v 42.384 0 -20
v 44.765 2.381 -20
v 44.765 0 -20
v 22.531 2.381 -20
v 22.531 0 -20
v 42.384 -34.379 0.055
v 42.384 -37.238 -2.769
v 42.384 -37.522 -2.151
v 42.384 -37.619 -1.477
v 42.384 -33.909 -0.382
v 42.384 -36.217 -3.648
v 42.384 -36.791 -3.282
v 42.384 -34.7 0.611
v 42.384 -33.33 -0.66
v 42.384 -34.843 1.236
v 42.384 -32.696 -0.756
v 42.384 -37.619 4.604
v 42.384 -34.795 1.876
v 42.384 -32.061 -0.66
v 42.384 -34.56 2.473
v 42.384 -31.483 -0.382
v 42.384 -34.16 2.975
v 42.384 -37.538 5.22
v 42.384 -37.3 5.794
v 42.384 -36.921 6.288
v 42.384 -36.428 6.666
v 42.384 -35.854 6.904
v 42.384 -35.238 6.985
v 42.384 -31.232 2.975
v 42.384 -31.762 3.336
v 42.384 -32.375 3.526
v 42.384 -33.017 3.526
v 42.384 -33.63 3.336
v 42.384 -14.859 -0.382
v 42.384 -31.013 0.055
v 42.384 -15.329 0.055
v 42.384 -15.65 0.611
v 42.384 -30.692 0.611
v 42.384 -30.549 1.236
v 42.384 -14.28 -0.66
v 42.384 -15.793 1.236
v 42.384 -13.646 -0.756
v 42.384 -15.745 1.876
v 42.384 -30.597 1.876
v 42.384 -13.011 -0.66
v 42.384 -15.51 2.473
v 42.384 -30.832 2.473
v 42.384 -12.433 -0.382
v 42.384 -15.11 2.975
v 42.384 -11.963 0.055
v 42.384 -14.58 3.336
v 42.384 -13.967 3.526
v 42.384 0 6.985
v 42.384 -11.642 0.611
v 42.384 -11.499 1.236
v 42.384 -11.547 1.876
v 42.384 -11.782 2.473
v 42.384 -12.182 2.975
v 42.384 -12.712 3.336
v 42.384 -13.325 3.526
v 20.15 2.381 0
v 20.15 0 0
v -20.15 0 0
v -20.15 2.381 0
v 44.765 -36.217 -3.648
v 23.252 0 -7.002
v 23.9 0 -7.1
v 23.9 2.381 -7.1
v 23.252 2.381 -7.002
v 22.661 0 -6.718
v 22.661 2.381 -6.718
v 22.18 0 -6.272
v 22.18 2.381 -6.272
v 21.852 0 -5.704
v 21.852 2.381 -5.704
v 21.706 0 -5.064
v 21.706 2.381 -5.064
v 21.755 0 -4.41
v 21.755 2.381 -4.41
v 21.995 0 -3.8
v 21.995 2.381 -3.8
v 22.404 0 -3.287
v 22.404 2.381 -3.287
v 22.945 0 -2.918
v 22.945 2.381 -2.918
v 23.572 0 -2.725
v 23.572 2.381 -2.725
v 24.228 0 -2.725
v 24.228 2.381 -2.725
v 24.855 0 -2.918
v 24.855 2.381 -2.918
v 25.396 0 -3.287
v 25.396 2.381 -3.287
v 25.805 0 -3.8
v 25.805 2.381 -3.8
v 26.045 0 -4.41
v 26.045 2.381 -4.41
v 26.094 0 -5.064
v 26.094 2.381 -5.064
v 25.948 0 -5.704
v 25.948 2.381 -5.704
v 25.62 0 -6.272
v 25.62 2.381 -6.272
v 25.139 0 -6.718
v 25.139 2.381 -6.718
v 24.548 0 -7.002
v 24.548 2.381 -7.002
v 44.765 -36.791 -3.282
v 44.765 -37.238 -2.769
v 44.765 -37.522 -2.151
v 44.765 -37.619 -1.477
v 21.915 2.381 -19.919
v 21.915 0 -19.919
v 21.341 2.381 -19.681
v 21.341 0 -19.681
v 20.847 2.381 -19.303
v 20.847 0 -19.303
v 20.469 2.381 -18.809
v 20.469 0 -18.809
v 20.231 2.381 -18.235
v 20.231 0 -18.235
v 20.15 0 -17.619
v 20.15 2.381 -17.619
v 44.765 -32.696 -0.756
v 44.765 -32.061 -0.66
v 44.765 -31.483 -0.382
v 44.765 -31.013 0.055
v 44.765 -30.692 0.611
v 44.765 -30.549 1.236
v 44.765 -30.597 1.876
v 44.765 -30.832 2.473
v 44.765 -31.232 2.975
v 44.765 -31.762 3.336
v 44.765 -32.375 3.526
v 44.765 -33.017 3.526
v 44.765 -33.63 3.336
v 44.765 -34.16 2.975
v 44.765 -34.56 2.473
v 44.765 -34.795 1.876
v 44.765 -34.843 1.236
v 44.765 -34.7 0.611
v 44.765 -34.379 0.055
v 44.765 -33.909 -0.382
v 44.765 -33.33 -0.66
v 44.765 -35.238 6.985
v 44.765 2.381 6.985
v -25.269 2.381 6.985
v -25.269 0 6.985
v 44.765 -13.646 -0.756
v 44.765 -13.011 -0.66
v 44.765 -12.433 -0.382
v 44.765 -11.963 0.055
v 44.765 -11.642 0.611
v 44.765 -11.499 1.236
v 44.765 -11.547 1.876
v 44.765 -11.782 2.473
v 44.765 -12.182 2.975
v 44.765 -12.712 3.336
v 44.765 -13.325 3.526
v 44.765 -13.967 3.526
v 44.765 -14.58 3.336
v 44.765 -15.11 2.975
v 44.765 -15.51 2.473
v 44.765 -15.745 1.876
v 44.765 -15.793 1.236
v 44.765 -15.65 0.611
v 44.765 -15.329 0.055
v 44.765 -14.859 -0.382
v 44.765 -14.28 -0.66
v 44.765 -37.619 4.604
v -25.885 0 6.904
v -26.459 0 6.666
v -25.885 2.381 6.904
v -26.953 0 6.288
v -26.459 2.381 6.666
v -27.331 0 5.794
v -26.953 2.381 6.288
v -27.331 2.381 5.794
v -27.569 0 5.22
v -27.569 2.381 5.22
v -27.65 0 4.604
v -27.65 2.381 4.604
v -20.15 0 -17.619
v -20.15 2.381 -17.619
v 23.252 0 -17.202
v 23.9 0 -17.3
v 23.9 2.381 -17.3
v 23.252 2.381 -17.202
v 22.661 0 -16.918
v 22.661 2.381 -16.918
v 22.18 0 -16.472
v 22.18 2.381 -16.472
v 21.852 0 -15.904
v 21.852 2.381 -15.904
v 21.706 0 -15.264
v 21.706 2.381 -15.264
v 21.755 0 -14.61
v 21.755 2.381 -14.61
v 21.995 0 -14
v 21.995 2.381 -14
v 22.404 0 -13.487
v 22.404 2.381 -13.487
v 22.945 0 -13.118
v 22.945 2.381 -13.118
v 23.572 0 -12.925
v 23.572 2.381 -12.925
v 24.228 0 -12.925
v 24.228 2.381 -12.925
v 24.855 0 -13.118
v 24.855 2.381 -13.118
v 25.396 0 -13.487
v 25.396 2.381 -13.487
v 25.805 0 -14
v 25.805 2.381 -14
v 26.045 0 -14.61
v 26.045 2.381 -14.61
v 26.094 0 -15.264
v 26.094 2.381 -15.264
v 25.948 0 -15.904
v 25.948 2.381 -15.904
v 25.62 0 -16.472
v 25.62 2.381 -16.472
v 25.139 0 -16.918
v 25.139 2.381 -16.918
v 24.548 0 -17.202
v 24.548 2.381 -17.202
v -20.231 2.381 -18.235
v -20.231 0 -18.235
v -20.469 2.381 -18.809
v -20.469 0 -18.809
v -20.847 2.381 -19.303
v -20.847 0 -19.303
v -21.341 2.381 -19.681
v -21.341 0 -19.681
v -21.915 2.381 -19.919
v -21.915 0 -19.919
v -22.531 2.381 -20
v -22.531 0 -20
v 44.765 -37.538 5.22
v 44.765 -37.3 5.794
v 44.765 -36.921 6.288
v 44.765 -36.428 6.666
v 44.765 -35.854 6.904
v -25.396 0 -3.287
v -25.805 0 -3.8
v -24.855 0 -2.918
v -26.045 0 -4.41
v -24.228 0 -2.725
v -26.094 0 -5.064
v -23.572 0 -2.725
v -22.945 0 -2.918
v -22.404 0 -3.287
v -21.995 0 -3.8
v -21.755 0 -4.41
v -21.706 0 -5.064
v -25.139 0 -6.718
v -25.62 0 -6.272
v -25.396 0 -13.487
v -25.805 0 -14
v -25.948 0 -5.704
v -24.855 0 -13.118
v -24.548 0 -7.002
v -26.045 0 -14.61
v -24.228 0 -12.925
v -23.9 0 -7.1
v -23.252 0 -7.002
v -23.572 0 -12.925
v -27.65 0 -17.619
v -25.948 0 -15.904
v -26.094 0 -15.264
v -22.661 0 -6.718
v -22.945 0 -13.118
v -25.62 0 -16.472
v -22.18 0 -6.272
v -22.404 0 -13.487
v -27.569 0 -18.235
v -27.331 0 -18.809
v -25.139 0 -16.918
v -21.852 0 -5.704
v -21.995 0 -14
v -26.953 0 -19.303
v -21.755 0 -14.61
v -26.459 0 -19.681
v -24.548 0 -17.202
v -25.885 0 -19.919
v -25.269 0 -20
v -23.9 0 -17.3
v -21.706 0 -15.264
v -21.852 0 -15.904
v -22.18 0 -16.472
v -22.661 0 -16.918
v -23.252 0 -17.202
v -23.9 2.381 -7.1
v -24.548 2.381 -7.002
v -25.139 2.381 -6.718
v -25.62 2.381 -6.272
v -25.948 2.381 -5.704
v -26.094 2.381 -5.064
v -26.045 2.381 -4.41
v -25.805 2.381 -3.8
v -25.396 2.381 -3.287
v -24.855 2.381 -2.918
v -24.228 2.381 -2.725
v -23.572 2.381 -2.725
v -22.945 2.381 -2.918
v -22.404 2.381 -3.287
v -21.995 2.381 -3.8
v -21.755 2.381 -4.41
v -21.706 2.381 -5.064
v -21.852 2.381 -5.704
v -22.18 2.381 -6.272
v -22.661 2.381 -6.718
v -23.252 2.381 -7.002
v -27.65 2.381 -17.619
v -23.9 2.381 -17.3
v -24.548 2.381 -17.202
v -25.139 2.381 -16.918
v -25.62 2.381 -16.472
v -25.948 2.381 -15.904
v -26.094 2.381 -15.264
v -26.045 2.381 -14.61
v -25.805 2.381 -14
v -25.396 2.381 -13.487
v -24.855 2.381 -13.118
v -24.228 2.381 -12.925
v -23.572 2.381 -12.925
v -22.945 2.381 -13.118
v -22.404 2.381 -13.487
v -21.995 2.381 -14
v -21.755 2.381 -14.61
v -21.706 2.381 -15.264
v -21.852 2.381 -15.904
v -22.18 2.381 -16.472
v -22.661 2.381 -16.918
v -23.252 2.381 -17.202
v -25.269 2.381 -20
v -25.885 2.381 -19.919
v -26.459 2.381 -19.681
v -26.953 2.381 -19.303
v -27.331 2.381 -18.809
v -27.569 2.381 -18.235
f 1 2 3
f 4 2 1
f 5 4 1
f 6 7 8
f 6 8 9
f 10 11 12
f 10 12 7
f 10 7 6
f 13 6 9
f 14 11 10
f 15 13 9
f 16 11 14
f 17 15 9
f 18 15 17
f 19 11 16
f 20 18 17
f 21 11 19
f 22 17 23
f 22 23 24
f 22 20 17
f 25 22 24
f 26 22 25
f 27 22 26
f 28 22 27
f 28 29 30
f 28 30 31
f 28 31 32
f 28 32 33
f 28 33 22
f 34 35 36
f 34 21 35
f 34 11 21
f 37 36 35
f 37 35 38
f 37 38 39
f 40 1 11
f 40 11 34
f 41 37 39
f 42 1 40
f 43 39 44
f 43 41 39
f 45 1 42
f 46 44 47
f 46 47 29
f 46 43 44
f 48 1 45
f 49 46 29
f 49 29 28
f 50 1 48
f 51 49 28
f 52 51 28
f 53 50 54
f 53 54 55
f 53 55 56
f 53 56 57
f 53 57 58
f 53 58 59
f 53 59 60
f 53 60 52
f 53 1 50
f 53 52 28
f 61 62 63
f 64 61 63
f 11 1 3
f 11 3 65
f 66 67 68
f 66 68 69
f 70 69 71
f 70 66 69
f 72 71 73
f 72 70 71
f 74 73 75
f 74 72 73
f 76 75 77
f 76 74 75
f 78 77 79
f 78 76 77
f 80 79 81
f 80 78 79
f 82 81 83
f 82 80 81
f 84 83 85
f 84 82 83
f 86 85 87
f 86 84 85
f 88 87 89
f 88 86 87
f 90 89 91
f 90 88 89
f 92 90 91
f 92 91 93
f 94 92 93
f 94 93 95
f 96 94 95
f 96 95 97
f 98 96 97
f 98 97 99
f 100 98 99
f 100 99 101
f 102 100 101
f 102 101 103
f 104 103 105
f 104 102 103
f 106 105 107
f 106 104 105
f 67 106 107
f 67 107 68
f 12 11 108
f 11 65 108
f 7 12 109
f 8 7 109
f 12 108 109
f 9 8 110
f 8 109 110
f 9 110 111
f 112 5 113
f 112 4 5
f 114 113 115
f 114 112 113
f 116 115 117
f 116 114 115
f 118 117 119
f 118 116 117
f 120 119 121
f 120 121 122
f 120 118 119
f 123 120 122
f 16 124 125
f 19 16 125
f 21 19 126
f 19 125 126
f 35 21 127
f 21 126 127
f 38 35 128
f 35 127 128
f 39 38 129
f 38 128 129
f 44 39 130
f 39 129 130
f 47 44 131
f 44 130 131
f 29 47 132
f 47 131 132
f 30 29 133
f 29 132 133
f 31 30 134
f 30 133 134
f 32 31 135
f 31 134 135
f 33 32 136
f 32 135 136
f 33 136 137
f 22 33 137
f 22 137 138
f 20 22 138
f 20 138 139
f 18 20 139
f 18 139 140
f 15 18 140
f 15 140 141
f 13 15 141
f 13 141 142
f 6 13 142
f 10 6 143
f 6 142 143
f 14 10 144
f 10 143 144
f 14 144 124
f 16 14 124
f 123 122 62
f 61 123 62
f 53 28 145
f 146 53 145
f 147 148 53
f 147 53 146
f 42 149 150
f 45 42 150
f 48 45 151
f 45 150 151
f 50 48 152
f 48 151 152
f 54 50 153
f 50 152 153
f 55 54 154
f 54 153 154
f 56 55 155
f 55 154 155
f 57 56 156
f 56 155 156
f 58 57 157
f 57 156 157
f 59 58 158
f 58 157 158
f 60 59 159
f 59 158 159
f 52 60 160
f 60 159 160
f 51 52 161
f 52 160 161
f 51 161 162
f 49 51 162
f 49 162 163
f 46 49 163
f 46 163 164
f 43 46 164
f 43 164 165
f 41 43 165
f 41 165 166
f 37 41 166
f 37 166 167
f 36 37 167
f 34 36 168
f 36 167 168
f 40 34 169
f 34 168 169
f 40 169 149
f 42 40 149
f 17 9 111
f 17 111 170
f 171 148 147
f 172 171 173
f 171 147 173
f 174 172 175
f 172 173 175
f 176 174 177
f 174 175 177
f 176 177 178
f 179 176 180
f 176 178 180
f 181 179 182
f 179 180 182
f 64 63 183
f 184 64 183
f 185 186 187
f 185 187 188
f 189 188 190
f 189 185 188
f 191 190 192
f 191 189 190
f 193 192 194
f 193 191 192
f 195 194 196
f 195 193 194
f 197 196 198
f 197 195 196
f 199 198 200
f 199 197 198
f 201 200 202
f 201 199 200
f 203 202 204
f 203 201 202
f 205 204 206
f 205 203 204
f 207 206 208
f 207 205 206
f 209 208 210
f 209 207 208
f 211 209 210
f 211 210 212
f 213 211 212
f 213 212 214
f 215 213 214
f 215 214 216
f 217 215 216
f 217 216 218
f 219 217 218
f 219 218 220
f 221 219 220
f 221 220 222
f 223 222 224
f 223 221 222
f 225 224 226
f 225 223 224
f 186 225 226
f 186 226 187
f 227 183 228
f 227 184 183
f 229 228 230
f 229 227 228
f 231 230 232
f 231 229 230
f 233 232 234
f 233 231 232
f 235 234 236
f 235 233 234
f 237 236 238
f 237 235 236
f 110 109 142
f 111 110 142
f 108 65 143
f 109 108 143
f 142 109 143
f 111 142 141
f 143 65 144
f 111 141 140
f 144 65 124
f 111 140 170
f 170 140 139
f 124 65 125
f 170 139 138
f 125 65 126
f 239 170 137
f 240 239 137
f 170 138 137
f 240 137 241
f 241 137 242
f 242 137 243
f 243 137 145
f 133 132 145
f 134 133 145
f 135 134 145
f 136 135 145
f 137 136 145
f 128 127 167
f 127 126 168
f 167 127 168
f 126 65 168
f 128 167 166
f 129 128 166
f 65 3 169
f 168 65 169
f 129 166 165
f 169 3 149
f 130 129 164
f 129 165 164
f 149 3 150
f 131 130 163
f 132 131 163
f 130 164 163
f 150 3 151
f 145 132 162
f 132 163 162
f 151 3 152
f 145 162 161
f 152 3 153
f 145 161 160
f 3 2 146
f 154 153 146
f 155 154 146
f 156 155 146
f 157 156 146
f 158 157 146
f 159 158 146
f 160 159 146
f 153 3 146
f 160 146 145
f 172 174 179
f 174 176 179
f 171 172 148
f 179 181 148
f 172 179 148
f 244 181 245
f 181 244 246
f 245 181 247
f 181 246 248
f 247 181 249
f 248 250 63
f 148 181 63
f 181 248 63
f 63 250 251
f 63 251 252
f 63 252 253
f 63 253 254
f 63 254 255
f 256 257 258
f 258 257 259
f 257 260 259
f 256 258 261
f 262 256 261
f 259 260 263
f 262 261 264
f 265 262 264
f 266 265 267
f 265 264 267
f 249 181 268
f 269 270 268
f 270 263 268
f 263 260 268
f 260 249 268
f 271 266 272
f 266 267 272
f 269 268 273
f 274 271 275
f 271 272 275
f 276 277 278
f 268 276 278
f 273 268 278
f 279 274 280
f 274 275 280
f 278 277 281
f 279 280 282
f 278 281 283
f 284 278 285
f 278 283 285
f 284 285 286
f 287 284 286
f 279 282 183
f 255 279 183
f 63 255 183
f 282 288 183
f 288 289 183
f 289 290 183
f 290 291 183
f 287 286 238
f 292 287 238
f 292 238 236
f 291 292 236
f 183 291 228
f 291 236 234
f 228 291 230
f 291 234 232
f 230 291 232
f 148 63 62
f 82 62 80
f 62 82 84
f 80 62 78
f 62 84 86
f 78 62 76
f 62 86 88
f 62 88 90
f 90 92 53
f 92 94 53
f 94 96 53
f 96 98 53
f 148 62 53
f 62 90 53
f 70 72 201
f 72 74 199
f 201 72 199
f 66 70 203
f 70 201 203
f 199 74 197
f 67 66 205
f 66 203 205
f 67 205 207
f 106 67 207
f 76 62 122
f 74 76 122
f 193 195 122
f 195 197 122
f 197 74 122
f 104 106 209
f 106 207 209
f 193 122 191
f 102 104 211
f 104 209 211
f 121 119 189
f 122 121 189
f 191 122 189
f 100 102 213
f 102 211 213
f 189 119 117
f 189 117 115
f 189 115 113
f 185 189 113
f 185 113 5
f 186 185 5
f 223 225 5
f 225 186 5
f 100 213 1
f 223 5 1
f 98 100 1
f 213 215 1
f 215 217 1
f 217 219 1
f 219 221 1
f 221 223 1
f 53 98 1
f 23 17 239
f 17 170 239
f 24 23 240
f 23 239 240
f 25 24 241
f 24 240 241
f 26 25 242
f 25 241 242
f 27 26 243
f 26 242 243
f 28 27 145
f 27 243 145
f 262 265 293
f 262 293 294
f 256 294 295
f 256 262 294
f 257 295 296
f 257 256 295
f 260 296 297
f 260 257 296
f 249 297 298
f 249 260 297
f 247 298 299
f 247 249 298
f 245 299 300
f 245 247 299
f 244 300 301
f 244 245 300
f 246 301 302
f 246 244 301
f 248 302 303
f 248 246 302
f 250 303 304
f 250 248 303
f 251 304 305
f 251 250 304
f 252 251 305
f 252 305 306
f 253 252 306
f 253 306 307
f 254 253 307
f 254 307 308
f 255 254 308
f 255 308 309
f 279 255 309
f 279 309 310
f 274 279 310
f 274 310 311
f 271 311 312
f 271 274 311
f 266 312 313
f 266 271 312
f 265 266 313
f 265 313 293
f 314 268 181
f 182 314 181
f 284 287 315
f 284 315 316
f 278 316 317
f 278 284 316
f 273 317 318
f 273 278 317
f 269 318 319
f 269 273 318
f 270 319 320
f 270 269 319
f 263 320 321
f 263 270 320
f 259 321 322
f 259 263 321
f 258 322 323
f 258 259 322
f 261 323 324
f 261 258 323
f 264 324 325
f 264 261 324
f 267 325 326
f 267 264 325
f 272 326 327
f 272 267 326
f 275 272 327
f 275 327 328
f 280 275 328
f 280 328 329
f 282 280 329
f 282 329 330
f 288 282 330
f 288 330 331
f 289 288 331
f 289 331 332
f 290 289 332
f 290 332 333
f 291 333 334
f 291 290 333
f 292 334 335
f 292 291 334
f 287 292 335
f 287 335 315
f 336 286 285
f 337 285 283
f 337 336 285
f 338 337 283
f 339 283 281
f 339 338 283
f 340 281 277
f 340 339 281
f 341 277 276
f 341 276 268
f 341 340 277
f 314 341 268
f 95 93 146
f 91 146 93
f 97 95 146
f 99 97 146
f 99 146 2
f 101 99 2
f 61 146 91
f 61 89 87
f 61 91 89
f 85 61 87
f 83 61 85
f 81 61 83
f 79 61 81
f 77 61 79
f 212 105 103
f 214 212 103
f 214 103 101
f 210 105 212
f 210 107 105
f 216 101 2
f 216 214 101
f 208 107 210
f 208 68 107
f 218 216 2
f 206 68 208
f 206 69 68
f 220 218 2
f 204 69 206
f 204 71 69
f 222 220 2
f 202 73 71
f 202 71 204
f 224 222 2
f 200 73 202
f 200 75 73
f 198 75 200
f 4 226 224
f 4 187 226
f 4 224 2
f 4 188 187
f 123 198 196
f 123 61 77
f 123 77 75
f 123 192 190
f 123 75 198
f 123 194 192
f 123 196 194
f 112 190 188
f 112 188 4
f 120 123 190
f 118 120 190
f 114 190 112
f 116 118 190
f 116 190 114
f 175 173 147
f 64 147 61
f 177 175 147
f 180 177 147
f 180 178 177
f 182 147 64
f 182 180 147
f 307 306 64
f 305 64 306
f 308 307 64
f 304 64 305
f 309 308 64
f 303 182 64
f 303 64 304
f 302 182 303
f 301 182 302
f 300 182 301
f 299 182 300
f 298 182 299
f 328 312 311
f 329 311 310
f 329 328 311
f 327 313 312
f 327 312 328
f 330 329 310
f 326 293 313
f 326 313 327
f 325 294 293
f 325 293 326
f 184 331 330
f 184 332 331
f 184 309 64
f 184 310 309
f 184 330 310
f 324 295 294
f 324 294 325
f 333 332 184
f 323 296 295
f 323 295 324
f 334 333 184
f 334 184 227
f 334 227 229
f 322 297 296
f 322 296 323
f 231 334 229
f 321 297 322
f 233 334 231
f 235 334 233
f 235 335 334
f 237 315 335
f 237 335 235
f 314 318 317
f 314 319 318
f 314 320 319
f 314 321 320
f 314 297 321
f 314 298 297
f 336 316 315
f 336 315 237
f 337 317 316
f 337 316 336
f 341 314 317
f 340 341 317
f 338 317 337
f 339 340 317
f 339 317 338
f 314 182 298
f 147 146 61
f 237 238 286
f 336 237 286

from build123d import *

# Parameters (mm, degrees)
SKETCH1_R           = 2.2
BOSS_EXTRUDE1_DEPTH = 2.38125
BOSS_EXTRUDE3_DEPTH = 2.38125
SKETCH4_R           = 2.15265
CUT_EXTRUDE1_DEPTH  = 2.38125
FILLET2_R           = 2.38125


with BuildPart() as part:
    # Sketch1 → Boss-Extrude1 (new body)
    # profile 1 of 2: a face of its own
    with BuildSketch(Plane(origin=(0, 0, 0), x_dir=(1, 0, 0), z_dir=(0, 1, 0))):
        Polygon((0, -6.985), (0, 0), (-20.15, 0), (-20.15, 20), (-27.65, 20), (-27.65, -6.985), align=None)
        with Locations(Location((-23.9, 4.9, 0), (0, 0, 90))):
            Circle(SKETCH1_R, mode=Mode.SUBTRACT)
        with Locations(Location((-23.9, 15.1, 0), (0, 0, 90))):
            Circle(SKETCH1_R, mode=Mode.SUBTRACT)
    # profile 2 of 2: a face of its own
    with BuildSketch(Plane(origin=(0, 0, 0), x_dir=(1, 0, 0), z_dir=(0, 1, 0))):
        Polygon((20.15, 20), (20.15, 0), (0, 0), (0, -6.985), (27.65, -6.985), (42.38375, -6.985), (42.38375, 20), align=None)
        with Locations(Location((23.9, 4.9, 0), (0, 0, 90))):
            Circle(SKETCH1_R, mode=Mode.SUBTRACT)
        with Locations(Location((23.9, 15.1, 0), (0, 0, 90))):
            Circle(SKETCH1_R, mode=Mode.SUBTRACT)
    extrude(amount=BOSS_EXTRUDE1_DEPTH)

    # Sketch3 → Boss-Extrude3 (add)
    with BuildSketch(Plane(origin=(42.38375, 0, 0), x_dir=(0, 0, -1), z_dir=(1, 0, 0))):
        Polygon((20, 0), (3.015, -37.61875), (-6.985, -37.61875), (-6.985, 2.38125), (20, 2.38125), align=None)
    extrude(amount=BOSS_EXTRUDE3_DEPTH)

    # Sketch4 → Cut-Extrude1 (cut)
    with BuildSketch(Plane(origin=(44.765, 0, 0), x_dir=(0, 0, -1), z_dir=(1, 0, 0))):
        with Locations((-1.397, -13.64595)):
            Circle(SKETCH4_R)
        with Locations((-1.397, -32.69595)):
            Circle(SKETCH4_R)
    extrude(amount=-CUT_EXTRUDE1_DEPTH, mode=Mode.SUBTRACT)

    # Fillet2
    fillet2_edges = [part.edges().sort_by_distance(p)[0] for p in [
        (-27.65, 1.190625, 6.985),
        (-27.65, 1.190625, -20),
        (-20.15, 1.190625, -20),
        (20.15, 1.190625, -20),
        (43.574375, -37.61875, 6.985),
        (43.574375, -37.61875, -3.015),
    ]]
    fillet(fillet2_edges, radius=FILLET2_R)


solid = part.part
